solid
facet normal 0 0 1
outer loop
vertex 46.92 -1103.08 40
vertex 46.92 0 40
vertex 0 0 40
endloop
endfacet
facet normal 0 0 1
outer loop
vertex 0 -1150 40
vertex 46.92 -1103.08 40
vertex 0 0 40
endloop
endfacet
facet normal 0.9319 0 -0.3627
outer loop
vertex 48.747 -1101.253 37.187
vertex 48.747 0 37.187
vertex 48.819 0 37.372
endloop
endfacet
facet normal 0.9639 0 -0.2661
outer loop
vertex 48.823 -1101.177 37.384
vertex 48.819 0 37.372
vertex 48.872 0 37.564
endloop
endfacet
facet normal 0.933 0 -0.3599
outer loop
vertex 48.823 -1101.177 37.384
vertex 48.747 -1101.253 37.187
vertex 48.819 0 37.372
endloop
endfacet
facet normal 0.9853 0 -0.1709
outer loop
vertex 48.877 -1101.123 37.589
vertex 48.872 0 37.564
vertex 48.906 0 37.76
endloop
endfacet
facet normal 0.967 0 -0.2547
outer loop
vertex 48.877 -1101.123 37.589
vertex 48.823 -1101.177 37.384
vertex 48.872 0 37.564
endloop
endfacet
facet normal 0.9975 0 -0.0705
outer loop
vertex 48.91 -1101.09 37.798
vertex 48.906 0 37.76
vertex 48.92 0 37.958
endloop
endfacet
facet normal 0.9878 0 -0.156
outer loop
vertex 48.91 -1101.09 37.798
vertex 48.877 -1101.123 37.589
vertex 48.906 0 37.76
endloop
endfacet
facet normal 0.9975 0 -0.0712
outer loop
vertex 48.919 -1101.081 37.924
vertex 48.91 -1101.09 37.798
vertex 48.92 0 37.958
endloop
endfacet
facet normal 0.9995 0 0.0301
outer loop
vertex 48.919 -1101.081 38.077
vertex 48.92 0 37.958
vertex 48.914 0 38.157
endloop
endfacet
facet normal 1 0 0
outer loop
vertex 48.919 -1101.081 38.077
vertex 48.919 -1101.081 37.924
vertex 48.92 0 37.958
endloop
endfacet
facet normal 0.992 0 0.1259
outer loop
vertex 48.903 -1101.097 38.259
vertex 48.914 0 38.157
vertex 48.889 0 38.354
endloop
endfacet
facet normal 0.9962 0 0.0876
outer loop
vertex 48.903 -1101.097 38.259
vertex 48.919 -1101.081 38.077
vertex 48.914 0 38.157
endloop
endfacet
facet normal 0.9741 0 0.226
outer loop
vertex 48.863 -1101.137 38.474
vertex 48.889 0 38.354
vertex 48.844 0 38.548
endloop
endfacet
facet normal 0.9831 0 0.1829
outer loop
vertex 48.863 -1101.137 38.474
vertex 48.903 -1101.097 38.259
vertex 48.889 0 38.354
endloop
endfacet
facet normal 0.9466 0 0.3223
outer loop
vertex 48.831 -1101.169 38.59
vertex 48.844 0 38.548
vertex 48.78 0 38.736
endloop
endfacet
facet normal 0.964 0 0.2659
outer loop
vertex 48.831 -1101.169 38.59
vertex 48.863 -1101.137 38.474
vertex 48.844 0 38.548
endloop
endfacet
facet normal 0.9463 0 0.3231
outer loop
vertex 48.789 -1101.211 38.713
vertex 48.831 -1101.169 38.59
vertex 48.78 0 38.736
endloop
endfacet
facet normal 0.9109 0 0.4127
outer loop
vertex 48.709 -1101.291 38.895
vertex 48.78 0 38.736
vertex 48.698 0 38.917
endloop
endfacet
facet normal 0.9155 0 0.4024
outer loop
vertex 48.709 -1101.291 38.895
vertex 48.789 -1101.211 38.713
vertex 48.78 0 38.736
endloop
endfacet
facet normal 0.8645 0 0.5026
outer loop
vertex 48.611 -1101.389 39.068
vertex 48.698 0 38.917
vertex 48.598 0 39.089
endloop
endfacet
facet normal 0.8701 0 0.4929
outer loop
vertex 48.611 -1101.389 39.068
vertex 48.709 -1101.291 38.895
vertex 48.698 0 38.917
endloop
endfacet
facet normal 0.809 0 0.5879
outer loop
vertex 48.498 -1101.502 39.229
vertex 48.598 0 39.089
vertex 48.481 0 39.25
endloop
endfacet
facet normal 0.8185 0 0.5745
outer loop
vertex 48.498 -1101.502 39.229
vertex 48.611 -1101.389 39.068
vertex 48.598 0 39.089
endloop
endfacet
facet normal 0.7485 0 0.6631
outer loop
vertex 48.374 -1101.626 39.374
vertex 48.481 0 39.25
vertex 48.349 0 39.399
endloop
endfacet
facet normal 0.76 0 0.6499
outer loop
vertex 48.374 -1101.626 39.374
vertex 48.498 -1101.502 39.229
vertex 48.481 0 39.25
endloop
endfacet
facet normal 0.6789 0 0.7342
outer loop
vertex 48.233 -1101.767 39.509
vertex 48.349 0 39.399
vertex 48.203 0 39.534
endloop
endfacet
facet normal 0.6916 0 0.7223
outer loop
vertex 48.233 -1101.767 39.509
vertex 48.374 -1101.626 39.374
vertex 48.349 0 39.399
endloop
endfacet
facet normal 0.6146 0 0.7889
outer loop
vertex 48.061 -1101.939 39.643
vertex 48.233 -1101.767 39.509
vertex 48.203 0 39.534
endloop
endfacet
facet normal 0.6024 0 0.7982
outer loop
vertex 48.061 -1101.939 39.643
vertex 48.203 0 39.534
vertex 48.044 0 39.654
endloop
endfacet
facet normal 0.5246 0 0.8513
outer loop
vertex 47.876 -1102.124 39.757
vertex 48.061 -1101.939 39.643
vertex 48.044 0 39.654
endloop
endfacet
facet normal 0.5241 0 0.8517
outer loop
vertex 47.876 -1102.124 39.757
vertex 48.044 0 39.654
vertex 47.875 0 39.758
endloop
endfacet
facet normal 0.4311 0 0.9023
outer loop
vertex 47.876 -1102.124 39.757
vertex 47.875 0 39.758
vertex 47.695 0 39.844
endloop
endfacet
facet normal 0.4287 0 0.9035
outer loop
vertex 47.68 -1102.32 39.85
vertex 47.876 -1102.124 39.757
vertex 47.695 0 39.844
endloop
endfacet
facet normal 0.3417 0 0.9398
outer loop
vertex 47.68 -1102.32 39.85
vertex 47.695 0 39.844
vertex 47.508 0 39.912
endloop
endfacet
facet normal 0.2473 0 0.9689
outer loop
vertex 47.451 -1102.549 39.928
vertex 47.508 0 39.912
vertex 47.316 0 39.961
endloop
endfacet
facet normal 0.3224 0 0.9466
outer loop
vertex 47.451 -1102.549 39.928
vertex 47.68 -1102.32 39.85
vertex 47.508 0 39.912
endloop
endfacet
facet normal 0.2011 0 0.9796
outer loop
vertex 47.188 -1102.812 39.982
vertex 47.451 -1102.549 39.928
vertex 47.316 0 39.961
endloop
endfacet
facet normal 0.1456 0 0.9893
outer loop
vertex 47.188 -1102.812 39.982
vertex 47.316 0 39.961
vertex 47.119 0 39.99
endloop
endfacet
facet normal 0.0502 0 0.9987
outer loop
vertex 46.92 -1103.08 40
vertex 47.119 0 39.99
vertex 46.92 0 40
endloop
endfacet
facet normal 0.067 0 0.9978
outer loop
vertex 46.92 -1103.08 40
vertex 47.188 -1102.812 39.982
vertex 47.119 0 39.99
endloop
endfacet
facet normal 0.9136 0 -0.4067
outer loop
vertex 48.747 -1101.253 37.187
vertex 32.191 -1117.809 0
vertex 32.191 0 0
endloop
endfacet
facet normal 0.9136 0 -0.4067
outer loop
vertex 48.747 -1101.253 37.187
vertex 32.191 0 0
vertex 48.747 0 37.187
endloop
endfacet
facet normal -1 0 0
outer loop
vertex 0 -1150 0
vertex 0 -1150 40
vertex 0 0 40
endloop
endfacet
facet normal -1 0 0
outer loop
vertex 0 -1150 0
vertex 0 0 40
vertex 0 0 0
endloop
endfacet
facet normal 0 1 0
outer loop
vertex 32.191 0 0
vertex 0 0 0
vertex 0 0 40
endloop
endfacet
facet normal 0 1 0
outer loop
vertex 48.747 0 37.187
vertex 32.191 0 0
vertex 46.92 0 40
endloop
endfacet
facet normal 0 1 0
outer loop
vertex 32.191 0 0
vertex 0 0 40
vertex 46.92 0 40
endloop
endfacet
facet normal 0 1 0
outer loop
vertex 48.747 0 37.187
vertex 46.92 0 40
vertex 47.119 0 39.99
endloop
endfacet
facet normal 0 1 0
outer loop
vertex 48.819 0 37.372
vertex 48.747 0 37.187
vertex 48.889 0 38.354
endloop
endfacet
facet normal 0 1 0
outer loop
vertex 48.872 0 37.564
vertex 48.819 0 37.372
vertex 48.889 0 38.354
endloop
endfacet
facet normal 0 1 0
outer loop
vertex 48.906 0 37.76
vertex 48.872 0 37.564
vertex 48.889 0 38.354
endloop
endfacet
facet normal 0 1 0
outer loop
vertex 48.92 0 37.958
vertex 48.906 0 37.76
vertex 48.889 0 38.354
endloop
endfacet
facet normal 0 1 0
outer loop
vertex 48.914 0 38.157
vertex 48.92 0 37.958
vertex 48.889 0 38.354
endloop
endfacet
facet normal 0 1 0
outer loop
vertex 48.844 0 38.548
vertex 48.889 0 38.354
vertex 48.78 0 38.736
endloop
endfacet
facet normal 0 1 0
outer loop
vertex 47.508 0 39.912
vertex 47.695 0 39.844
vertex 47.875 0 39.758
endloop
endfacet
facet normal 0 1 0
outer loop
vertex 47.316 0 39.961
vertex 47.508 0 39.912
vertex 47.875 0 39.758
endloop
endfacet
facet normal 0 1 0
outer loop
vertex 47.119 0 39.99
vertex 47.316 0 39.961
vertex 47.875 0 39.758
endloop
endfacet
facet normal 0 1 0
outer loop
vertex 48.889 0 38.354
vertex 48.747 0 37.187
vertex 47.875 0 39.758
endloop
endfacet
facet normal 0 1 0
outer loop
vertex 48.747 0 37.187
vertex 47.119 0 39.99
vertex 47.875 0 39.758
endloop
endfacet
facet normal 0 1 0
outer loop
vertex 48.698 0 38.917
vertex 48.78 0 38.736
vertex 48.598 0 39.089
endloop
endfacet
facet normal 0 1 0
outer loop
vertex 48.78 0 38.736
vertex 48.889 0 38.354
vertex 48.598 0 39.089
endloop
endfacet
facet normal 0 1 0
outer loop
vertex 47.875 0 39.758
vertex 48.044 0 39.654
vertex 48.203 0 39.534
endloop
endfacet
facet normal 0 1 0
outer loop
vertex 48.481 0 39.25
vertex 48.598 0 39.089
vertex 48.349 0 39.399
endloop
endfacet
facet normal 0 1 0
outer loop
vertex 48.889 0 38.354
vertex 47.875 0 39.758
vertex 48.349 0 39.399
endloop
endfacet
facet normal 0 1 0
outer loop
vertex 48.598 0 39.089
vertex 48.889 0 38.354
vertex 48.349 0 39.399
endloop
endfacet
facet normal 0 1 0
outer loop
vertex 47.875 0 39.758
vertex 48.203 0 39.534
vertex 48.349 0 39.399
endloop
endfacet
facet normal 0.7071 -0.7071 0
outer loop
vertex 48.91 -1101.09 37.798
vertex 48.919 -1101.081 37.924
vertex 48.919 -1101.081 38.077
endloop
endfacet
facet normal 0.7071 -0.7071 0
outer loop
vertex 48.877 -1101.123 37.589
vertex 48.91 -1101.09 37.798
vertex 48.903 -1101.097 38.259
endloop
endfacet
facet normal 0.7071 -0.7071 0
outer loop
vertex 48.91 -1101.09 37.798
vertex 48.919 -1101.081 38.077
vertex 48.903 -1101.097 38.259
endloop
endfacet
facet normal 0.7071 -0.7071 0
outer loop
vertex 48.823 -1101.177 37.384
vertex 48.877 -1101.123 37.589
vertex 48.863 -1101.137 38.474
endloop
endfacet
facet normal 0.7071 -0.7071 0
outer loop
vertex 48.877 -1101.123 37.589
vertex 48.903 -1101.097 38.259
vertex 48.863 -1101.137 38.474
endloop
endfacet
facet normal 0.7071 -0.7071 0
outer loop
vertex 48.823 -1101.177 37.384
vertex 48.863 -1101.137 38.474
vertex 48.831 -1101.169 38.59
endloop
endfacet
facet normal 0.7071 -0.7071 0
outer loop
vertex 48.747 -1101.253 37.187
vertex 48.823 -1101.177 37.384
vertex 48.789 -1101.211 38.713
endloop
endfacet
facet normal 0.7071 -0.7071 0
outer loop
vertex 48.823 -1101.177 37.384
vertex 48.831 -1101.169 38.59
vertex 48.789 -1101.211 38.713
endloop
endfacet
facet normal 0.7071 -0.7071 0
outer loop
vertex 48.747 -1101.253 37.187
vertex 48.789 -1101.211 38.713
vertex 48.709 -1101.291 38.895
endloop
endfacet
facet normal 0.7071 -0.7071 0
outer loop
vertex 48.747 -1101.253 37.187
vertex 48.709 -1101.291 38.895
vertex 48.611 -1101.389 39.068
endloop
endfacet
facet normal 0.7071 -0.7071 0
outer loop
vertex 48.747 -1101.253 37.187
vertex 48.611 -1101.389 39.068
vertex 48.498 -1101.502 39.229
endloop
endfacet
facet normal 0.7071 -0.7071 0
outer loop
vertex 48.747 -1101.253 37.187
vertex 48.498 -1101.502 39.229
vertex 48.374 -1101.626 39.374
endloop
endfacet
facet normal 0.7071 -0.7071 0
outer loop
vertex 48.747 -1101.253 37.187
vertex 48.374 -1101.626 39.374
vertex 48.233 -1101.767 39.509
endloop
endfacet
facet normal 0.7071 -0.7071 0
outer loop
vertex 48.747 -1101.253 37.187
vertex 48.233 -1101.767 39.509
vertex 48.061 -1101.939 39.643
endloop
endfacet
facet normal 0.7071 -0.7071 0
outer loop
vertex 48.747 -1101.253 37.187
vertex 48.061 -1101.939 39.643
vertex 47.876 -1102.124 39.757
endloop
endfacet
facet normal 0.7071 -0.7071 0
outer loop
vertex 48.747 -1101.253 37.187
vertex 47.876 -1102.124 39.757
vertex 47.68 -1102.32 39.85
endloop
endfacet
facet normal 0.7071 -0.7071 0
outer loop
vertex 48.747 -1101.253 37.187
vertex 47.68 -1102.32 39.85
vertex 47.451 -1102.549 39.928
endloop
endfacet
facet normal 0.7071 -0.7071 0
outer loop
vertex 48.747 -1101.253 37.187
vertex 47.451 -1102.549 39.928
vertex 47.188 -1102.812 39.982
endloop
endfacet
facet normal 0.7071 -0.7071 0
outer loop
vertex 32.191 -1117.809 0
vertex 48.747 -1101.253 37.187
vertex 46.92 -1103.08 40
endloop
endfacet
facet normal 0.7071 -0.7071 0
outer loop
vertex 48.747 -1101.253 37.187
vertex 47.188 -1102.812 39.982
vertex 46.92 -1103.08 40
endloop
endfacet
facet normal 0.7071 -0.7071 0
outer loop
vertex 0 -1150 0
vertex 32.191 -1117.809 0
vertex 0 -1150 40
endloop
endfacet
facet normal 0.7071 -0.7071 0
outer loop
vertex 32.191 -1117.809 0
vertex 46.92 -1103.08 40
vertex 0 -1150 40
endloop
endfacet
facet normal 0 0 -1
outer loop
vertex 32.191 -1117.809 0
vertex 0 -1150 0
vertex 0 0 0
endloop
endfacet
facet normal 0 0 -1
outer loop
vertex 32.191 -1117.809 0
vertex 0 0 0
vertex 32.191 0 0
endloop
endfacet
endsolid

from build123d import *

# Parameters (mm, degrees)
F1_DEPTH = 1150
F2_R     = 2
F4_DEPTH = 40.001


with BuildPart() as f1:
    # F0 (on Front) → F1 (new body)
    with BuildSketch(Plane.XZ):
        Polygon((0, 40), (0, 0), (32.190853, 0), (50, 40), align=None)
    extrude(amount=F1_DEPTH)

    # F2
    f2_edges = [f1.edges().sort_by_distance(p)[0] for p in [
        (50, -575, 40),
    ]]
    fillet(f2_edges, radius=F2_R)

    # F3 (on face) → F4 (cut, through all)
    with BuildSketch(Plane.XY.offset(40)):
        Polygon((46.92027, -1103.07973), (0, -1150), (46.92027, -1150), align=None)
        Polygon((53.244177, -1096.755823), (46.92027, -1103.07973), (46.92027, -1150), (53.244177, -1150), align=None)
    extrude(amount=-F4_DEPTH, mode=Mode.SUBTRACT)


solid = f1.part
